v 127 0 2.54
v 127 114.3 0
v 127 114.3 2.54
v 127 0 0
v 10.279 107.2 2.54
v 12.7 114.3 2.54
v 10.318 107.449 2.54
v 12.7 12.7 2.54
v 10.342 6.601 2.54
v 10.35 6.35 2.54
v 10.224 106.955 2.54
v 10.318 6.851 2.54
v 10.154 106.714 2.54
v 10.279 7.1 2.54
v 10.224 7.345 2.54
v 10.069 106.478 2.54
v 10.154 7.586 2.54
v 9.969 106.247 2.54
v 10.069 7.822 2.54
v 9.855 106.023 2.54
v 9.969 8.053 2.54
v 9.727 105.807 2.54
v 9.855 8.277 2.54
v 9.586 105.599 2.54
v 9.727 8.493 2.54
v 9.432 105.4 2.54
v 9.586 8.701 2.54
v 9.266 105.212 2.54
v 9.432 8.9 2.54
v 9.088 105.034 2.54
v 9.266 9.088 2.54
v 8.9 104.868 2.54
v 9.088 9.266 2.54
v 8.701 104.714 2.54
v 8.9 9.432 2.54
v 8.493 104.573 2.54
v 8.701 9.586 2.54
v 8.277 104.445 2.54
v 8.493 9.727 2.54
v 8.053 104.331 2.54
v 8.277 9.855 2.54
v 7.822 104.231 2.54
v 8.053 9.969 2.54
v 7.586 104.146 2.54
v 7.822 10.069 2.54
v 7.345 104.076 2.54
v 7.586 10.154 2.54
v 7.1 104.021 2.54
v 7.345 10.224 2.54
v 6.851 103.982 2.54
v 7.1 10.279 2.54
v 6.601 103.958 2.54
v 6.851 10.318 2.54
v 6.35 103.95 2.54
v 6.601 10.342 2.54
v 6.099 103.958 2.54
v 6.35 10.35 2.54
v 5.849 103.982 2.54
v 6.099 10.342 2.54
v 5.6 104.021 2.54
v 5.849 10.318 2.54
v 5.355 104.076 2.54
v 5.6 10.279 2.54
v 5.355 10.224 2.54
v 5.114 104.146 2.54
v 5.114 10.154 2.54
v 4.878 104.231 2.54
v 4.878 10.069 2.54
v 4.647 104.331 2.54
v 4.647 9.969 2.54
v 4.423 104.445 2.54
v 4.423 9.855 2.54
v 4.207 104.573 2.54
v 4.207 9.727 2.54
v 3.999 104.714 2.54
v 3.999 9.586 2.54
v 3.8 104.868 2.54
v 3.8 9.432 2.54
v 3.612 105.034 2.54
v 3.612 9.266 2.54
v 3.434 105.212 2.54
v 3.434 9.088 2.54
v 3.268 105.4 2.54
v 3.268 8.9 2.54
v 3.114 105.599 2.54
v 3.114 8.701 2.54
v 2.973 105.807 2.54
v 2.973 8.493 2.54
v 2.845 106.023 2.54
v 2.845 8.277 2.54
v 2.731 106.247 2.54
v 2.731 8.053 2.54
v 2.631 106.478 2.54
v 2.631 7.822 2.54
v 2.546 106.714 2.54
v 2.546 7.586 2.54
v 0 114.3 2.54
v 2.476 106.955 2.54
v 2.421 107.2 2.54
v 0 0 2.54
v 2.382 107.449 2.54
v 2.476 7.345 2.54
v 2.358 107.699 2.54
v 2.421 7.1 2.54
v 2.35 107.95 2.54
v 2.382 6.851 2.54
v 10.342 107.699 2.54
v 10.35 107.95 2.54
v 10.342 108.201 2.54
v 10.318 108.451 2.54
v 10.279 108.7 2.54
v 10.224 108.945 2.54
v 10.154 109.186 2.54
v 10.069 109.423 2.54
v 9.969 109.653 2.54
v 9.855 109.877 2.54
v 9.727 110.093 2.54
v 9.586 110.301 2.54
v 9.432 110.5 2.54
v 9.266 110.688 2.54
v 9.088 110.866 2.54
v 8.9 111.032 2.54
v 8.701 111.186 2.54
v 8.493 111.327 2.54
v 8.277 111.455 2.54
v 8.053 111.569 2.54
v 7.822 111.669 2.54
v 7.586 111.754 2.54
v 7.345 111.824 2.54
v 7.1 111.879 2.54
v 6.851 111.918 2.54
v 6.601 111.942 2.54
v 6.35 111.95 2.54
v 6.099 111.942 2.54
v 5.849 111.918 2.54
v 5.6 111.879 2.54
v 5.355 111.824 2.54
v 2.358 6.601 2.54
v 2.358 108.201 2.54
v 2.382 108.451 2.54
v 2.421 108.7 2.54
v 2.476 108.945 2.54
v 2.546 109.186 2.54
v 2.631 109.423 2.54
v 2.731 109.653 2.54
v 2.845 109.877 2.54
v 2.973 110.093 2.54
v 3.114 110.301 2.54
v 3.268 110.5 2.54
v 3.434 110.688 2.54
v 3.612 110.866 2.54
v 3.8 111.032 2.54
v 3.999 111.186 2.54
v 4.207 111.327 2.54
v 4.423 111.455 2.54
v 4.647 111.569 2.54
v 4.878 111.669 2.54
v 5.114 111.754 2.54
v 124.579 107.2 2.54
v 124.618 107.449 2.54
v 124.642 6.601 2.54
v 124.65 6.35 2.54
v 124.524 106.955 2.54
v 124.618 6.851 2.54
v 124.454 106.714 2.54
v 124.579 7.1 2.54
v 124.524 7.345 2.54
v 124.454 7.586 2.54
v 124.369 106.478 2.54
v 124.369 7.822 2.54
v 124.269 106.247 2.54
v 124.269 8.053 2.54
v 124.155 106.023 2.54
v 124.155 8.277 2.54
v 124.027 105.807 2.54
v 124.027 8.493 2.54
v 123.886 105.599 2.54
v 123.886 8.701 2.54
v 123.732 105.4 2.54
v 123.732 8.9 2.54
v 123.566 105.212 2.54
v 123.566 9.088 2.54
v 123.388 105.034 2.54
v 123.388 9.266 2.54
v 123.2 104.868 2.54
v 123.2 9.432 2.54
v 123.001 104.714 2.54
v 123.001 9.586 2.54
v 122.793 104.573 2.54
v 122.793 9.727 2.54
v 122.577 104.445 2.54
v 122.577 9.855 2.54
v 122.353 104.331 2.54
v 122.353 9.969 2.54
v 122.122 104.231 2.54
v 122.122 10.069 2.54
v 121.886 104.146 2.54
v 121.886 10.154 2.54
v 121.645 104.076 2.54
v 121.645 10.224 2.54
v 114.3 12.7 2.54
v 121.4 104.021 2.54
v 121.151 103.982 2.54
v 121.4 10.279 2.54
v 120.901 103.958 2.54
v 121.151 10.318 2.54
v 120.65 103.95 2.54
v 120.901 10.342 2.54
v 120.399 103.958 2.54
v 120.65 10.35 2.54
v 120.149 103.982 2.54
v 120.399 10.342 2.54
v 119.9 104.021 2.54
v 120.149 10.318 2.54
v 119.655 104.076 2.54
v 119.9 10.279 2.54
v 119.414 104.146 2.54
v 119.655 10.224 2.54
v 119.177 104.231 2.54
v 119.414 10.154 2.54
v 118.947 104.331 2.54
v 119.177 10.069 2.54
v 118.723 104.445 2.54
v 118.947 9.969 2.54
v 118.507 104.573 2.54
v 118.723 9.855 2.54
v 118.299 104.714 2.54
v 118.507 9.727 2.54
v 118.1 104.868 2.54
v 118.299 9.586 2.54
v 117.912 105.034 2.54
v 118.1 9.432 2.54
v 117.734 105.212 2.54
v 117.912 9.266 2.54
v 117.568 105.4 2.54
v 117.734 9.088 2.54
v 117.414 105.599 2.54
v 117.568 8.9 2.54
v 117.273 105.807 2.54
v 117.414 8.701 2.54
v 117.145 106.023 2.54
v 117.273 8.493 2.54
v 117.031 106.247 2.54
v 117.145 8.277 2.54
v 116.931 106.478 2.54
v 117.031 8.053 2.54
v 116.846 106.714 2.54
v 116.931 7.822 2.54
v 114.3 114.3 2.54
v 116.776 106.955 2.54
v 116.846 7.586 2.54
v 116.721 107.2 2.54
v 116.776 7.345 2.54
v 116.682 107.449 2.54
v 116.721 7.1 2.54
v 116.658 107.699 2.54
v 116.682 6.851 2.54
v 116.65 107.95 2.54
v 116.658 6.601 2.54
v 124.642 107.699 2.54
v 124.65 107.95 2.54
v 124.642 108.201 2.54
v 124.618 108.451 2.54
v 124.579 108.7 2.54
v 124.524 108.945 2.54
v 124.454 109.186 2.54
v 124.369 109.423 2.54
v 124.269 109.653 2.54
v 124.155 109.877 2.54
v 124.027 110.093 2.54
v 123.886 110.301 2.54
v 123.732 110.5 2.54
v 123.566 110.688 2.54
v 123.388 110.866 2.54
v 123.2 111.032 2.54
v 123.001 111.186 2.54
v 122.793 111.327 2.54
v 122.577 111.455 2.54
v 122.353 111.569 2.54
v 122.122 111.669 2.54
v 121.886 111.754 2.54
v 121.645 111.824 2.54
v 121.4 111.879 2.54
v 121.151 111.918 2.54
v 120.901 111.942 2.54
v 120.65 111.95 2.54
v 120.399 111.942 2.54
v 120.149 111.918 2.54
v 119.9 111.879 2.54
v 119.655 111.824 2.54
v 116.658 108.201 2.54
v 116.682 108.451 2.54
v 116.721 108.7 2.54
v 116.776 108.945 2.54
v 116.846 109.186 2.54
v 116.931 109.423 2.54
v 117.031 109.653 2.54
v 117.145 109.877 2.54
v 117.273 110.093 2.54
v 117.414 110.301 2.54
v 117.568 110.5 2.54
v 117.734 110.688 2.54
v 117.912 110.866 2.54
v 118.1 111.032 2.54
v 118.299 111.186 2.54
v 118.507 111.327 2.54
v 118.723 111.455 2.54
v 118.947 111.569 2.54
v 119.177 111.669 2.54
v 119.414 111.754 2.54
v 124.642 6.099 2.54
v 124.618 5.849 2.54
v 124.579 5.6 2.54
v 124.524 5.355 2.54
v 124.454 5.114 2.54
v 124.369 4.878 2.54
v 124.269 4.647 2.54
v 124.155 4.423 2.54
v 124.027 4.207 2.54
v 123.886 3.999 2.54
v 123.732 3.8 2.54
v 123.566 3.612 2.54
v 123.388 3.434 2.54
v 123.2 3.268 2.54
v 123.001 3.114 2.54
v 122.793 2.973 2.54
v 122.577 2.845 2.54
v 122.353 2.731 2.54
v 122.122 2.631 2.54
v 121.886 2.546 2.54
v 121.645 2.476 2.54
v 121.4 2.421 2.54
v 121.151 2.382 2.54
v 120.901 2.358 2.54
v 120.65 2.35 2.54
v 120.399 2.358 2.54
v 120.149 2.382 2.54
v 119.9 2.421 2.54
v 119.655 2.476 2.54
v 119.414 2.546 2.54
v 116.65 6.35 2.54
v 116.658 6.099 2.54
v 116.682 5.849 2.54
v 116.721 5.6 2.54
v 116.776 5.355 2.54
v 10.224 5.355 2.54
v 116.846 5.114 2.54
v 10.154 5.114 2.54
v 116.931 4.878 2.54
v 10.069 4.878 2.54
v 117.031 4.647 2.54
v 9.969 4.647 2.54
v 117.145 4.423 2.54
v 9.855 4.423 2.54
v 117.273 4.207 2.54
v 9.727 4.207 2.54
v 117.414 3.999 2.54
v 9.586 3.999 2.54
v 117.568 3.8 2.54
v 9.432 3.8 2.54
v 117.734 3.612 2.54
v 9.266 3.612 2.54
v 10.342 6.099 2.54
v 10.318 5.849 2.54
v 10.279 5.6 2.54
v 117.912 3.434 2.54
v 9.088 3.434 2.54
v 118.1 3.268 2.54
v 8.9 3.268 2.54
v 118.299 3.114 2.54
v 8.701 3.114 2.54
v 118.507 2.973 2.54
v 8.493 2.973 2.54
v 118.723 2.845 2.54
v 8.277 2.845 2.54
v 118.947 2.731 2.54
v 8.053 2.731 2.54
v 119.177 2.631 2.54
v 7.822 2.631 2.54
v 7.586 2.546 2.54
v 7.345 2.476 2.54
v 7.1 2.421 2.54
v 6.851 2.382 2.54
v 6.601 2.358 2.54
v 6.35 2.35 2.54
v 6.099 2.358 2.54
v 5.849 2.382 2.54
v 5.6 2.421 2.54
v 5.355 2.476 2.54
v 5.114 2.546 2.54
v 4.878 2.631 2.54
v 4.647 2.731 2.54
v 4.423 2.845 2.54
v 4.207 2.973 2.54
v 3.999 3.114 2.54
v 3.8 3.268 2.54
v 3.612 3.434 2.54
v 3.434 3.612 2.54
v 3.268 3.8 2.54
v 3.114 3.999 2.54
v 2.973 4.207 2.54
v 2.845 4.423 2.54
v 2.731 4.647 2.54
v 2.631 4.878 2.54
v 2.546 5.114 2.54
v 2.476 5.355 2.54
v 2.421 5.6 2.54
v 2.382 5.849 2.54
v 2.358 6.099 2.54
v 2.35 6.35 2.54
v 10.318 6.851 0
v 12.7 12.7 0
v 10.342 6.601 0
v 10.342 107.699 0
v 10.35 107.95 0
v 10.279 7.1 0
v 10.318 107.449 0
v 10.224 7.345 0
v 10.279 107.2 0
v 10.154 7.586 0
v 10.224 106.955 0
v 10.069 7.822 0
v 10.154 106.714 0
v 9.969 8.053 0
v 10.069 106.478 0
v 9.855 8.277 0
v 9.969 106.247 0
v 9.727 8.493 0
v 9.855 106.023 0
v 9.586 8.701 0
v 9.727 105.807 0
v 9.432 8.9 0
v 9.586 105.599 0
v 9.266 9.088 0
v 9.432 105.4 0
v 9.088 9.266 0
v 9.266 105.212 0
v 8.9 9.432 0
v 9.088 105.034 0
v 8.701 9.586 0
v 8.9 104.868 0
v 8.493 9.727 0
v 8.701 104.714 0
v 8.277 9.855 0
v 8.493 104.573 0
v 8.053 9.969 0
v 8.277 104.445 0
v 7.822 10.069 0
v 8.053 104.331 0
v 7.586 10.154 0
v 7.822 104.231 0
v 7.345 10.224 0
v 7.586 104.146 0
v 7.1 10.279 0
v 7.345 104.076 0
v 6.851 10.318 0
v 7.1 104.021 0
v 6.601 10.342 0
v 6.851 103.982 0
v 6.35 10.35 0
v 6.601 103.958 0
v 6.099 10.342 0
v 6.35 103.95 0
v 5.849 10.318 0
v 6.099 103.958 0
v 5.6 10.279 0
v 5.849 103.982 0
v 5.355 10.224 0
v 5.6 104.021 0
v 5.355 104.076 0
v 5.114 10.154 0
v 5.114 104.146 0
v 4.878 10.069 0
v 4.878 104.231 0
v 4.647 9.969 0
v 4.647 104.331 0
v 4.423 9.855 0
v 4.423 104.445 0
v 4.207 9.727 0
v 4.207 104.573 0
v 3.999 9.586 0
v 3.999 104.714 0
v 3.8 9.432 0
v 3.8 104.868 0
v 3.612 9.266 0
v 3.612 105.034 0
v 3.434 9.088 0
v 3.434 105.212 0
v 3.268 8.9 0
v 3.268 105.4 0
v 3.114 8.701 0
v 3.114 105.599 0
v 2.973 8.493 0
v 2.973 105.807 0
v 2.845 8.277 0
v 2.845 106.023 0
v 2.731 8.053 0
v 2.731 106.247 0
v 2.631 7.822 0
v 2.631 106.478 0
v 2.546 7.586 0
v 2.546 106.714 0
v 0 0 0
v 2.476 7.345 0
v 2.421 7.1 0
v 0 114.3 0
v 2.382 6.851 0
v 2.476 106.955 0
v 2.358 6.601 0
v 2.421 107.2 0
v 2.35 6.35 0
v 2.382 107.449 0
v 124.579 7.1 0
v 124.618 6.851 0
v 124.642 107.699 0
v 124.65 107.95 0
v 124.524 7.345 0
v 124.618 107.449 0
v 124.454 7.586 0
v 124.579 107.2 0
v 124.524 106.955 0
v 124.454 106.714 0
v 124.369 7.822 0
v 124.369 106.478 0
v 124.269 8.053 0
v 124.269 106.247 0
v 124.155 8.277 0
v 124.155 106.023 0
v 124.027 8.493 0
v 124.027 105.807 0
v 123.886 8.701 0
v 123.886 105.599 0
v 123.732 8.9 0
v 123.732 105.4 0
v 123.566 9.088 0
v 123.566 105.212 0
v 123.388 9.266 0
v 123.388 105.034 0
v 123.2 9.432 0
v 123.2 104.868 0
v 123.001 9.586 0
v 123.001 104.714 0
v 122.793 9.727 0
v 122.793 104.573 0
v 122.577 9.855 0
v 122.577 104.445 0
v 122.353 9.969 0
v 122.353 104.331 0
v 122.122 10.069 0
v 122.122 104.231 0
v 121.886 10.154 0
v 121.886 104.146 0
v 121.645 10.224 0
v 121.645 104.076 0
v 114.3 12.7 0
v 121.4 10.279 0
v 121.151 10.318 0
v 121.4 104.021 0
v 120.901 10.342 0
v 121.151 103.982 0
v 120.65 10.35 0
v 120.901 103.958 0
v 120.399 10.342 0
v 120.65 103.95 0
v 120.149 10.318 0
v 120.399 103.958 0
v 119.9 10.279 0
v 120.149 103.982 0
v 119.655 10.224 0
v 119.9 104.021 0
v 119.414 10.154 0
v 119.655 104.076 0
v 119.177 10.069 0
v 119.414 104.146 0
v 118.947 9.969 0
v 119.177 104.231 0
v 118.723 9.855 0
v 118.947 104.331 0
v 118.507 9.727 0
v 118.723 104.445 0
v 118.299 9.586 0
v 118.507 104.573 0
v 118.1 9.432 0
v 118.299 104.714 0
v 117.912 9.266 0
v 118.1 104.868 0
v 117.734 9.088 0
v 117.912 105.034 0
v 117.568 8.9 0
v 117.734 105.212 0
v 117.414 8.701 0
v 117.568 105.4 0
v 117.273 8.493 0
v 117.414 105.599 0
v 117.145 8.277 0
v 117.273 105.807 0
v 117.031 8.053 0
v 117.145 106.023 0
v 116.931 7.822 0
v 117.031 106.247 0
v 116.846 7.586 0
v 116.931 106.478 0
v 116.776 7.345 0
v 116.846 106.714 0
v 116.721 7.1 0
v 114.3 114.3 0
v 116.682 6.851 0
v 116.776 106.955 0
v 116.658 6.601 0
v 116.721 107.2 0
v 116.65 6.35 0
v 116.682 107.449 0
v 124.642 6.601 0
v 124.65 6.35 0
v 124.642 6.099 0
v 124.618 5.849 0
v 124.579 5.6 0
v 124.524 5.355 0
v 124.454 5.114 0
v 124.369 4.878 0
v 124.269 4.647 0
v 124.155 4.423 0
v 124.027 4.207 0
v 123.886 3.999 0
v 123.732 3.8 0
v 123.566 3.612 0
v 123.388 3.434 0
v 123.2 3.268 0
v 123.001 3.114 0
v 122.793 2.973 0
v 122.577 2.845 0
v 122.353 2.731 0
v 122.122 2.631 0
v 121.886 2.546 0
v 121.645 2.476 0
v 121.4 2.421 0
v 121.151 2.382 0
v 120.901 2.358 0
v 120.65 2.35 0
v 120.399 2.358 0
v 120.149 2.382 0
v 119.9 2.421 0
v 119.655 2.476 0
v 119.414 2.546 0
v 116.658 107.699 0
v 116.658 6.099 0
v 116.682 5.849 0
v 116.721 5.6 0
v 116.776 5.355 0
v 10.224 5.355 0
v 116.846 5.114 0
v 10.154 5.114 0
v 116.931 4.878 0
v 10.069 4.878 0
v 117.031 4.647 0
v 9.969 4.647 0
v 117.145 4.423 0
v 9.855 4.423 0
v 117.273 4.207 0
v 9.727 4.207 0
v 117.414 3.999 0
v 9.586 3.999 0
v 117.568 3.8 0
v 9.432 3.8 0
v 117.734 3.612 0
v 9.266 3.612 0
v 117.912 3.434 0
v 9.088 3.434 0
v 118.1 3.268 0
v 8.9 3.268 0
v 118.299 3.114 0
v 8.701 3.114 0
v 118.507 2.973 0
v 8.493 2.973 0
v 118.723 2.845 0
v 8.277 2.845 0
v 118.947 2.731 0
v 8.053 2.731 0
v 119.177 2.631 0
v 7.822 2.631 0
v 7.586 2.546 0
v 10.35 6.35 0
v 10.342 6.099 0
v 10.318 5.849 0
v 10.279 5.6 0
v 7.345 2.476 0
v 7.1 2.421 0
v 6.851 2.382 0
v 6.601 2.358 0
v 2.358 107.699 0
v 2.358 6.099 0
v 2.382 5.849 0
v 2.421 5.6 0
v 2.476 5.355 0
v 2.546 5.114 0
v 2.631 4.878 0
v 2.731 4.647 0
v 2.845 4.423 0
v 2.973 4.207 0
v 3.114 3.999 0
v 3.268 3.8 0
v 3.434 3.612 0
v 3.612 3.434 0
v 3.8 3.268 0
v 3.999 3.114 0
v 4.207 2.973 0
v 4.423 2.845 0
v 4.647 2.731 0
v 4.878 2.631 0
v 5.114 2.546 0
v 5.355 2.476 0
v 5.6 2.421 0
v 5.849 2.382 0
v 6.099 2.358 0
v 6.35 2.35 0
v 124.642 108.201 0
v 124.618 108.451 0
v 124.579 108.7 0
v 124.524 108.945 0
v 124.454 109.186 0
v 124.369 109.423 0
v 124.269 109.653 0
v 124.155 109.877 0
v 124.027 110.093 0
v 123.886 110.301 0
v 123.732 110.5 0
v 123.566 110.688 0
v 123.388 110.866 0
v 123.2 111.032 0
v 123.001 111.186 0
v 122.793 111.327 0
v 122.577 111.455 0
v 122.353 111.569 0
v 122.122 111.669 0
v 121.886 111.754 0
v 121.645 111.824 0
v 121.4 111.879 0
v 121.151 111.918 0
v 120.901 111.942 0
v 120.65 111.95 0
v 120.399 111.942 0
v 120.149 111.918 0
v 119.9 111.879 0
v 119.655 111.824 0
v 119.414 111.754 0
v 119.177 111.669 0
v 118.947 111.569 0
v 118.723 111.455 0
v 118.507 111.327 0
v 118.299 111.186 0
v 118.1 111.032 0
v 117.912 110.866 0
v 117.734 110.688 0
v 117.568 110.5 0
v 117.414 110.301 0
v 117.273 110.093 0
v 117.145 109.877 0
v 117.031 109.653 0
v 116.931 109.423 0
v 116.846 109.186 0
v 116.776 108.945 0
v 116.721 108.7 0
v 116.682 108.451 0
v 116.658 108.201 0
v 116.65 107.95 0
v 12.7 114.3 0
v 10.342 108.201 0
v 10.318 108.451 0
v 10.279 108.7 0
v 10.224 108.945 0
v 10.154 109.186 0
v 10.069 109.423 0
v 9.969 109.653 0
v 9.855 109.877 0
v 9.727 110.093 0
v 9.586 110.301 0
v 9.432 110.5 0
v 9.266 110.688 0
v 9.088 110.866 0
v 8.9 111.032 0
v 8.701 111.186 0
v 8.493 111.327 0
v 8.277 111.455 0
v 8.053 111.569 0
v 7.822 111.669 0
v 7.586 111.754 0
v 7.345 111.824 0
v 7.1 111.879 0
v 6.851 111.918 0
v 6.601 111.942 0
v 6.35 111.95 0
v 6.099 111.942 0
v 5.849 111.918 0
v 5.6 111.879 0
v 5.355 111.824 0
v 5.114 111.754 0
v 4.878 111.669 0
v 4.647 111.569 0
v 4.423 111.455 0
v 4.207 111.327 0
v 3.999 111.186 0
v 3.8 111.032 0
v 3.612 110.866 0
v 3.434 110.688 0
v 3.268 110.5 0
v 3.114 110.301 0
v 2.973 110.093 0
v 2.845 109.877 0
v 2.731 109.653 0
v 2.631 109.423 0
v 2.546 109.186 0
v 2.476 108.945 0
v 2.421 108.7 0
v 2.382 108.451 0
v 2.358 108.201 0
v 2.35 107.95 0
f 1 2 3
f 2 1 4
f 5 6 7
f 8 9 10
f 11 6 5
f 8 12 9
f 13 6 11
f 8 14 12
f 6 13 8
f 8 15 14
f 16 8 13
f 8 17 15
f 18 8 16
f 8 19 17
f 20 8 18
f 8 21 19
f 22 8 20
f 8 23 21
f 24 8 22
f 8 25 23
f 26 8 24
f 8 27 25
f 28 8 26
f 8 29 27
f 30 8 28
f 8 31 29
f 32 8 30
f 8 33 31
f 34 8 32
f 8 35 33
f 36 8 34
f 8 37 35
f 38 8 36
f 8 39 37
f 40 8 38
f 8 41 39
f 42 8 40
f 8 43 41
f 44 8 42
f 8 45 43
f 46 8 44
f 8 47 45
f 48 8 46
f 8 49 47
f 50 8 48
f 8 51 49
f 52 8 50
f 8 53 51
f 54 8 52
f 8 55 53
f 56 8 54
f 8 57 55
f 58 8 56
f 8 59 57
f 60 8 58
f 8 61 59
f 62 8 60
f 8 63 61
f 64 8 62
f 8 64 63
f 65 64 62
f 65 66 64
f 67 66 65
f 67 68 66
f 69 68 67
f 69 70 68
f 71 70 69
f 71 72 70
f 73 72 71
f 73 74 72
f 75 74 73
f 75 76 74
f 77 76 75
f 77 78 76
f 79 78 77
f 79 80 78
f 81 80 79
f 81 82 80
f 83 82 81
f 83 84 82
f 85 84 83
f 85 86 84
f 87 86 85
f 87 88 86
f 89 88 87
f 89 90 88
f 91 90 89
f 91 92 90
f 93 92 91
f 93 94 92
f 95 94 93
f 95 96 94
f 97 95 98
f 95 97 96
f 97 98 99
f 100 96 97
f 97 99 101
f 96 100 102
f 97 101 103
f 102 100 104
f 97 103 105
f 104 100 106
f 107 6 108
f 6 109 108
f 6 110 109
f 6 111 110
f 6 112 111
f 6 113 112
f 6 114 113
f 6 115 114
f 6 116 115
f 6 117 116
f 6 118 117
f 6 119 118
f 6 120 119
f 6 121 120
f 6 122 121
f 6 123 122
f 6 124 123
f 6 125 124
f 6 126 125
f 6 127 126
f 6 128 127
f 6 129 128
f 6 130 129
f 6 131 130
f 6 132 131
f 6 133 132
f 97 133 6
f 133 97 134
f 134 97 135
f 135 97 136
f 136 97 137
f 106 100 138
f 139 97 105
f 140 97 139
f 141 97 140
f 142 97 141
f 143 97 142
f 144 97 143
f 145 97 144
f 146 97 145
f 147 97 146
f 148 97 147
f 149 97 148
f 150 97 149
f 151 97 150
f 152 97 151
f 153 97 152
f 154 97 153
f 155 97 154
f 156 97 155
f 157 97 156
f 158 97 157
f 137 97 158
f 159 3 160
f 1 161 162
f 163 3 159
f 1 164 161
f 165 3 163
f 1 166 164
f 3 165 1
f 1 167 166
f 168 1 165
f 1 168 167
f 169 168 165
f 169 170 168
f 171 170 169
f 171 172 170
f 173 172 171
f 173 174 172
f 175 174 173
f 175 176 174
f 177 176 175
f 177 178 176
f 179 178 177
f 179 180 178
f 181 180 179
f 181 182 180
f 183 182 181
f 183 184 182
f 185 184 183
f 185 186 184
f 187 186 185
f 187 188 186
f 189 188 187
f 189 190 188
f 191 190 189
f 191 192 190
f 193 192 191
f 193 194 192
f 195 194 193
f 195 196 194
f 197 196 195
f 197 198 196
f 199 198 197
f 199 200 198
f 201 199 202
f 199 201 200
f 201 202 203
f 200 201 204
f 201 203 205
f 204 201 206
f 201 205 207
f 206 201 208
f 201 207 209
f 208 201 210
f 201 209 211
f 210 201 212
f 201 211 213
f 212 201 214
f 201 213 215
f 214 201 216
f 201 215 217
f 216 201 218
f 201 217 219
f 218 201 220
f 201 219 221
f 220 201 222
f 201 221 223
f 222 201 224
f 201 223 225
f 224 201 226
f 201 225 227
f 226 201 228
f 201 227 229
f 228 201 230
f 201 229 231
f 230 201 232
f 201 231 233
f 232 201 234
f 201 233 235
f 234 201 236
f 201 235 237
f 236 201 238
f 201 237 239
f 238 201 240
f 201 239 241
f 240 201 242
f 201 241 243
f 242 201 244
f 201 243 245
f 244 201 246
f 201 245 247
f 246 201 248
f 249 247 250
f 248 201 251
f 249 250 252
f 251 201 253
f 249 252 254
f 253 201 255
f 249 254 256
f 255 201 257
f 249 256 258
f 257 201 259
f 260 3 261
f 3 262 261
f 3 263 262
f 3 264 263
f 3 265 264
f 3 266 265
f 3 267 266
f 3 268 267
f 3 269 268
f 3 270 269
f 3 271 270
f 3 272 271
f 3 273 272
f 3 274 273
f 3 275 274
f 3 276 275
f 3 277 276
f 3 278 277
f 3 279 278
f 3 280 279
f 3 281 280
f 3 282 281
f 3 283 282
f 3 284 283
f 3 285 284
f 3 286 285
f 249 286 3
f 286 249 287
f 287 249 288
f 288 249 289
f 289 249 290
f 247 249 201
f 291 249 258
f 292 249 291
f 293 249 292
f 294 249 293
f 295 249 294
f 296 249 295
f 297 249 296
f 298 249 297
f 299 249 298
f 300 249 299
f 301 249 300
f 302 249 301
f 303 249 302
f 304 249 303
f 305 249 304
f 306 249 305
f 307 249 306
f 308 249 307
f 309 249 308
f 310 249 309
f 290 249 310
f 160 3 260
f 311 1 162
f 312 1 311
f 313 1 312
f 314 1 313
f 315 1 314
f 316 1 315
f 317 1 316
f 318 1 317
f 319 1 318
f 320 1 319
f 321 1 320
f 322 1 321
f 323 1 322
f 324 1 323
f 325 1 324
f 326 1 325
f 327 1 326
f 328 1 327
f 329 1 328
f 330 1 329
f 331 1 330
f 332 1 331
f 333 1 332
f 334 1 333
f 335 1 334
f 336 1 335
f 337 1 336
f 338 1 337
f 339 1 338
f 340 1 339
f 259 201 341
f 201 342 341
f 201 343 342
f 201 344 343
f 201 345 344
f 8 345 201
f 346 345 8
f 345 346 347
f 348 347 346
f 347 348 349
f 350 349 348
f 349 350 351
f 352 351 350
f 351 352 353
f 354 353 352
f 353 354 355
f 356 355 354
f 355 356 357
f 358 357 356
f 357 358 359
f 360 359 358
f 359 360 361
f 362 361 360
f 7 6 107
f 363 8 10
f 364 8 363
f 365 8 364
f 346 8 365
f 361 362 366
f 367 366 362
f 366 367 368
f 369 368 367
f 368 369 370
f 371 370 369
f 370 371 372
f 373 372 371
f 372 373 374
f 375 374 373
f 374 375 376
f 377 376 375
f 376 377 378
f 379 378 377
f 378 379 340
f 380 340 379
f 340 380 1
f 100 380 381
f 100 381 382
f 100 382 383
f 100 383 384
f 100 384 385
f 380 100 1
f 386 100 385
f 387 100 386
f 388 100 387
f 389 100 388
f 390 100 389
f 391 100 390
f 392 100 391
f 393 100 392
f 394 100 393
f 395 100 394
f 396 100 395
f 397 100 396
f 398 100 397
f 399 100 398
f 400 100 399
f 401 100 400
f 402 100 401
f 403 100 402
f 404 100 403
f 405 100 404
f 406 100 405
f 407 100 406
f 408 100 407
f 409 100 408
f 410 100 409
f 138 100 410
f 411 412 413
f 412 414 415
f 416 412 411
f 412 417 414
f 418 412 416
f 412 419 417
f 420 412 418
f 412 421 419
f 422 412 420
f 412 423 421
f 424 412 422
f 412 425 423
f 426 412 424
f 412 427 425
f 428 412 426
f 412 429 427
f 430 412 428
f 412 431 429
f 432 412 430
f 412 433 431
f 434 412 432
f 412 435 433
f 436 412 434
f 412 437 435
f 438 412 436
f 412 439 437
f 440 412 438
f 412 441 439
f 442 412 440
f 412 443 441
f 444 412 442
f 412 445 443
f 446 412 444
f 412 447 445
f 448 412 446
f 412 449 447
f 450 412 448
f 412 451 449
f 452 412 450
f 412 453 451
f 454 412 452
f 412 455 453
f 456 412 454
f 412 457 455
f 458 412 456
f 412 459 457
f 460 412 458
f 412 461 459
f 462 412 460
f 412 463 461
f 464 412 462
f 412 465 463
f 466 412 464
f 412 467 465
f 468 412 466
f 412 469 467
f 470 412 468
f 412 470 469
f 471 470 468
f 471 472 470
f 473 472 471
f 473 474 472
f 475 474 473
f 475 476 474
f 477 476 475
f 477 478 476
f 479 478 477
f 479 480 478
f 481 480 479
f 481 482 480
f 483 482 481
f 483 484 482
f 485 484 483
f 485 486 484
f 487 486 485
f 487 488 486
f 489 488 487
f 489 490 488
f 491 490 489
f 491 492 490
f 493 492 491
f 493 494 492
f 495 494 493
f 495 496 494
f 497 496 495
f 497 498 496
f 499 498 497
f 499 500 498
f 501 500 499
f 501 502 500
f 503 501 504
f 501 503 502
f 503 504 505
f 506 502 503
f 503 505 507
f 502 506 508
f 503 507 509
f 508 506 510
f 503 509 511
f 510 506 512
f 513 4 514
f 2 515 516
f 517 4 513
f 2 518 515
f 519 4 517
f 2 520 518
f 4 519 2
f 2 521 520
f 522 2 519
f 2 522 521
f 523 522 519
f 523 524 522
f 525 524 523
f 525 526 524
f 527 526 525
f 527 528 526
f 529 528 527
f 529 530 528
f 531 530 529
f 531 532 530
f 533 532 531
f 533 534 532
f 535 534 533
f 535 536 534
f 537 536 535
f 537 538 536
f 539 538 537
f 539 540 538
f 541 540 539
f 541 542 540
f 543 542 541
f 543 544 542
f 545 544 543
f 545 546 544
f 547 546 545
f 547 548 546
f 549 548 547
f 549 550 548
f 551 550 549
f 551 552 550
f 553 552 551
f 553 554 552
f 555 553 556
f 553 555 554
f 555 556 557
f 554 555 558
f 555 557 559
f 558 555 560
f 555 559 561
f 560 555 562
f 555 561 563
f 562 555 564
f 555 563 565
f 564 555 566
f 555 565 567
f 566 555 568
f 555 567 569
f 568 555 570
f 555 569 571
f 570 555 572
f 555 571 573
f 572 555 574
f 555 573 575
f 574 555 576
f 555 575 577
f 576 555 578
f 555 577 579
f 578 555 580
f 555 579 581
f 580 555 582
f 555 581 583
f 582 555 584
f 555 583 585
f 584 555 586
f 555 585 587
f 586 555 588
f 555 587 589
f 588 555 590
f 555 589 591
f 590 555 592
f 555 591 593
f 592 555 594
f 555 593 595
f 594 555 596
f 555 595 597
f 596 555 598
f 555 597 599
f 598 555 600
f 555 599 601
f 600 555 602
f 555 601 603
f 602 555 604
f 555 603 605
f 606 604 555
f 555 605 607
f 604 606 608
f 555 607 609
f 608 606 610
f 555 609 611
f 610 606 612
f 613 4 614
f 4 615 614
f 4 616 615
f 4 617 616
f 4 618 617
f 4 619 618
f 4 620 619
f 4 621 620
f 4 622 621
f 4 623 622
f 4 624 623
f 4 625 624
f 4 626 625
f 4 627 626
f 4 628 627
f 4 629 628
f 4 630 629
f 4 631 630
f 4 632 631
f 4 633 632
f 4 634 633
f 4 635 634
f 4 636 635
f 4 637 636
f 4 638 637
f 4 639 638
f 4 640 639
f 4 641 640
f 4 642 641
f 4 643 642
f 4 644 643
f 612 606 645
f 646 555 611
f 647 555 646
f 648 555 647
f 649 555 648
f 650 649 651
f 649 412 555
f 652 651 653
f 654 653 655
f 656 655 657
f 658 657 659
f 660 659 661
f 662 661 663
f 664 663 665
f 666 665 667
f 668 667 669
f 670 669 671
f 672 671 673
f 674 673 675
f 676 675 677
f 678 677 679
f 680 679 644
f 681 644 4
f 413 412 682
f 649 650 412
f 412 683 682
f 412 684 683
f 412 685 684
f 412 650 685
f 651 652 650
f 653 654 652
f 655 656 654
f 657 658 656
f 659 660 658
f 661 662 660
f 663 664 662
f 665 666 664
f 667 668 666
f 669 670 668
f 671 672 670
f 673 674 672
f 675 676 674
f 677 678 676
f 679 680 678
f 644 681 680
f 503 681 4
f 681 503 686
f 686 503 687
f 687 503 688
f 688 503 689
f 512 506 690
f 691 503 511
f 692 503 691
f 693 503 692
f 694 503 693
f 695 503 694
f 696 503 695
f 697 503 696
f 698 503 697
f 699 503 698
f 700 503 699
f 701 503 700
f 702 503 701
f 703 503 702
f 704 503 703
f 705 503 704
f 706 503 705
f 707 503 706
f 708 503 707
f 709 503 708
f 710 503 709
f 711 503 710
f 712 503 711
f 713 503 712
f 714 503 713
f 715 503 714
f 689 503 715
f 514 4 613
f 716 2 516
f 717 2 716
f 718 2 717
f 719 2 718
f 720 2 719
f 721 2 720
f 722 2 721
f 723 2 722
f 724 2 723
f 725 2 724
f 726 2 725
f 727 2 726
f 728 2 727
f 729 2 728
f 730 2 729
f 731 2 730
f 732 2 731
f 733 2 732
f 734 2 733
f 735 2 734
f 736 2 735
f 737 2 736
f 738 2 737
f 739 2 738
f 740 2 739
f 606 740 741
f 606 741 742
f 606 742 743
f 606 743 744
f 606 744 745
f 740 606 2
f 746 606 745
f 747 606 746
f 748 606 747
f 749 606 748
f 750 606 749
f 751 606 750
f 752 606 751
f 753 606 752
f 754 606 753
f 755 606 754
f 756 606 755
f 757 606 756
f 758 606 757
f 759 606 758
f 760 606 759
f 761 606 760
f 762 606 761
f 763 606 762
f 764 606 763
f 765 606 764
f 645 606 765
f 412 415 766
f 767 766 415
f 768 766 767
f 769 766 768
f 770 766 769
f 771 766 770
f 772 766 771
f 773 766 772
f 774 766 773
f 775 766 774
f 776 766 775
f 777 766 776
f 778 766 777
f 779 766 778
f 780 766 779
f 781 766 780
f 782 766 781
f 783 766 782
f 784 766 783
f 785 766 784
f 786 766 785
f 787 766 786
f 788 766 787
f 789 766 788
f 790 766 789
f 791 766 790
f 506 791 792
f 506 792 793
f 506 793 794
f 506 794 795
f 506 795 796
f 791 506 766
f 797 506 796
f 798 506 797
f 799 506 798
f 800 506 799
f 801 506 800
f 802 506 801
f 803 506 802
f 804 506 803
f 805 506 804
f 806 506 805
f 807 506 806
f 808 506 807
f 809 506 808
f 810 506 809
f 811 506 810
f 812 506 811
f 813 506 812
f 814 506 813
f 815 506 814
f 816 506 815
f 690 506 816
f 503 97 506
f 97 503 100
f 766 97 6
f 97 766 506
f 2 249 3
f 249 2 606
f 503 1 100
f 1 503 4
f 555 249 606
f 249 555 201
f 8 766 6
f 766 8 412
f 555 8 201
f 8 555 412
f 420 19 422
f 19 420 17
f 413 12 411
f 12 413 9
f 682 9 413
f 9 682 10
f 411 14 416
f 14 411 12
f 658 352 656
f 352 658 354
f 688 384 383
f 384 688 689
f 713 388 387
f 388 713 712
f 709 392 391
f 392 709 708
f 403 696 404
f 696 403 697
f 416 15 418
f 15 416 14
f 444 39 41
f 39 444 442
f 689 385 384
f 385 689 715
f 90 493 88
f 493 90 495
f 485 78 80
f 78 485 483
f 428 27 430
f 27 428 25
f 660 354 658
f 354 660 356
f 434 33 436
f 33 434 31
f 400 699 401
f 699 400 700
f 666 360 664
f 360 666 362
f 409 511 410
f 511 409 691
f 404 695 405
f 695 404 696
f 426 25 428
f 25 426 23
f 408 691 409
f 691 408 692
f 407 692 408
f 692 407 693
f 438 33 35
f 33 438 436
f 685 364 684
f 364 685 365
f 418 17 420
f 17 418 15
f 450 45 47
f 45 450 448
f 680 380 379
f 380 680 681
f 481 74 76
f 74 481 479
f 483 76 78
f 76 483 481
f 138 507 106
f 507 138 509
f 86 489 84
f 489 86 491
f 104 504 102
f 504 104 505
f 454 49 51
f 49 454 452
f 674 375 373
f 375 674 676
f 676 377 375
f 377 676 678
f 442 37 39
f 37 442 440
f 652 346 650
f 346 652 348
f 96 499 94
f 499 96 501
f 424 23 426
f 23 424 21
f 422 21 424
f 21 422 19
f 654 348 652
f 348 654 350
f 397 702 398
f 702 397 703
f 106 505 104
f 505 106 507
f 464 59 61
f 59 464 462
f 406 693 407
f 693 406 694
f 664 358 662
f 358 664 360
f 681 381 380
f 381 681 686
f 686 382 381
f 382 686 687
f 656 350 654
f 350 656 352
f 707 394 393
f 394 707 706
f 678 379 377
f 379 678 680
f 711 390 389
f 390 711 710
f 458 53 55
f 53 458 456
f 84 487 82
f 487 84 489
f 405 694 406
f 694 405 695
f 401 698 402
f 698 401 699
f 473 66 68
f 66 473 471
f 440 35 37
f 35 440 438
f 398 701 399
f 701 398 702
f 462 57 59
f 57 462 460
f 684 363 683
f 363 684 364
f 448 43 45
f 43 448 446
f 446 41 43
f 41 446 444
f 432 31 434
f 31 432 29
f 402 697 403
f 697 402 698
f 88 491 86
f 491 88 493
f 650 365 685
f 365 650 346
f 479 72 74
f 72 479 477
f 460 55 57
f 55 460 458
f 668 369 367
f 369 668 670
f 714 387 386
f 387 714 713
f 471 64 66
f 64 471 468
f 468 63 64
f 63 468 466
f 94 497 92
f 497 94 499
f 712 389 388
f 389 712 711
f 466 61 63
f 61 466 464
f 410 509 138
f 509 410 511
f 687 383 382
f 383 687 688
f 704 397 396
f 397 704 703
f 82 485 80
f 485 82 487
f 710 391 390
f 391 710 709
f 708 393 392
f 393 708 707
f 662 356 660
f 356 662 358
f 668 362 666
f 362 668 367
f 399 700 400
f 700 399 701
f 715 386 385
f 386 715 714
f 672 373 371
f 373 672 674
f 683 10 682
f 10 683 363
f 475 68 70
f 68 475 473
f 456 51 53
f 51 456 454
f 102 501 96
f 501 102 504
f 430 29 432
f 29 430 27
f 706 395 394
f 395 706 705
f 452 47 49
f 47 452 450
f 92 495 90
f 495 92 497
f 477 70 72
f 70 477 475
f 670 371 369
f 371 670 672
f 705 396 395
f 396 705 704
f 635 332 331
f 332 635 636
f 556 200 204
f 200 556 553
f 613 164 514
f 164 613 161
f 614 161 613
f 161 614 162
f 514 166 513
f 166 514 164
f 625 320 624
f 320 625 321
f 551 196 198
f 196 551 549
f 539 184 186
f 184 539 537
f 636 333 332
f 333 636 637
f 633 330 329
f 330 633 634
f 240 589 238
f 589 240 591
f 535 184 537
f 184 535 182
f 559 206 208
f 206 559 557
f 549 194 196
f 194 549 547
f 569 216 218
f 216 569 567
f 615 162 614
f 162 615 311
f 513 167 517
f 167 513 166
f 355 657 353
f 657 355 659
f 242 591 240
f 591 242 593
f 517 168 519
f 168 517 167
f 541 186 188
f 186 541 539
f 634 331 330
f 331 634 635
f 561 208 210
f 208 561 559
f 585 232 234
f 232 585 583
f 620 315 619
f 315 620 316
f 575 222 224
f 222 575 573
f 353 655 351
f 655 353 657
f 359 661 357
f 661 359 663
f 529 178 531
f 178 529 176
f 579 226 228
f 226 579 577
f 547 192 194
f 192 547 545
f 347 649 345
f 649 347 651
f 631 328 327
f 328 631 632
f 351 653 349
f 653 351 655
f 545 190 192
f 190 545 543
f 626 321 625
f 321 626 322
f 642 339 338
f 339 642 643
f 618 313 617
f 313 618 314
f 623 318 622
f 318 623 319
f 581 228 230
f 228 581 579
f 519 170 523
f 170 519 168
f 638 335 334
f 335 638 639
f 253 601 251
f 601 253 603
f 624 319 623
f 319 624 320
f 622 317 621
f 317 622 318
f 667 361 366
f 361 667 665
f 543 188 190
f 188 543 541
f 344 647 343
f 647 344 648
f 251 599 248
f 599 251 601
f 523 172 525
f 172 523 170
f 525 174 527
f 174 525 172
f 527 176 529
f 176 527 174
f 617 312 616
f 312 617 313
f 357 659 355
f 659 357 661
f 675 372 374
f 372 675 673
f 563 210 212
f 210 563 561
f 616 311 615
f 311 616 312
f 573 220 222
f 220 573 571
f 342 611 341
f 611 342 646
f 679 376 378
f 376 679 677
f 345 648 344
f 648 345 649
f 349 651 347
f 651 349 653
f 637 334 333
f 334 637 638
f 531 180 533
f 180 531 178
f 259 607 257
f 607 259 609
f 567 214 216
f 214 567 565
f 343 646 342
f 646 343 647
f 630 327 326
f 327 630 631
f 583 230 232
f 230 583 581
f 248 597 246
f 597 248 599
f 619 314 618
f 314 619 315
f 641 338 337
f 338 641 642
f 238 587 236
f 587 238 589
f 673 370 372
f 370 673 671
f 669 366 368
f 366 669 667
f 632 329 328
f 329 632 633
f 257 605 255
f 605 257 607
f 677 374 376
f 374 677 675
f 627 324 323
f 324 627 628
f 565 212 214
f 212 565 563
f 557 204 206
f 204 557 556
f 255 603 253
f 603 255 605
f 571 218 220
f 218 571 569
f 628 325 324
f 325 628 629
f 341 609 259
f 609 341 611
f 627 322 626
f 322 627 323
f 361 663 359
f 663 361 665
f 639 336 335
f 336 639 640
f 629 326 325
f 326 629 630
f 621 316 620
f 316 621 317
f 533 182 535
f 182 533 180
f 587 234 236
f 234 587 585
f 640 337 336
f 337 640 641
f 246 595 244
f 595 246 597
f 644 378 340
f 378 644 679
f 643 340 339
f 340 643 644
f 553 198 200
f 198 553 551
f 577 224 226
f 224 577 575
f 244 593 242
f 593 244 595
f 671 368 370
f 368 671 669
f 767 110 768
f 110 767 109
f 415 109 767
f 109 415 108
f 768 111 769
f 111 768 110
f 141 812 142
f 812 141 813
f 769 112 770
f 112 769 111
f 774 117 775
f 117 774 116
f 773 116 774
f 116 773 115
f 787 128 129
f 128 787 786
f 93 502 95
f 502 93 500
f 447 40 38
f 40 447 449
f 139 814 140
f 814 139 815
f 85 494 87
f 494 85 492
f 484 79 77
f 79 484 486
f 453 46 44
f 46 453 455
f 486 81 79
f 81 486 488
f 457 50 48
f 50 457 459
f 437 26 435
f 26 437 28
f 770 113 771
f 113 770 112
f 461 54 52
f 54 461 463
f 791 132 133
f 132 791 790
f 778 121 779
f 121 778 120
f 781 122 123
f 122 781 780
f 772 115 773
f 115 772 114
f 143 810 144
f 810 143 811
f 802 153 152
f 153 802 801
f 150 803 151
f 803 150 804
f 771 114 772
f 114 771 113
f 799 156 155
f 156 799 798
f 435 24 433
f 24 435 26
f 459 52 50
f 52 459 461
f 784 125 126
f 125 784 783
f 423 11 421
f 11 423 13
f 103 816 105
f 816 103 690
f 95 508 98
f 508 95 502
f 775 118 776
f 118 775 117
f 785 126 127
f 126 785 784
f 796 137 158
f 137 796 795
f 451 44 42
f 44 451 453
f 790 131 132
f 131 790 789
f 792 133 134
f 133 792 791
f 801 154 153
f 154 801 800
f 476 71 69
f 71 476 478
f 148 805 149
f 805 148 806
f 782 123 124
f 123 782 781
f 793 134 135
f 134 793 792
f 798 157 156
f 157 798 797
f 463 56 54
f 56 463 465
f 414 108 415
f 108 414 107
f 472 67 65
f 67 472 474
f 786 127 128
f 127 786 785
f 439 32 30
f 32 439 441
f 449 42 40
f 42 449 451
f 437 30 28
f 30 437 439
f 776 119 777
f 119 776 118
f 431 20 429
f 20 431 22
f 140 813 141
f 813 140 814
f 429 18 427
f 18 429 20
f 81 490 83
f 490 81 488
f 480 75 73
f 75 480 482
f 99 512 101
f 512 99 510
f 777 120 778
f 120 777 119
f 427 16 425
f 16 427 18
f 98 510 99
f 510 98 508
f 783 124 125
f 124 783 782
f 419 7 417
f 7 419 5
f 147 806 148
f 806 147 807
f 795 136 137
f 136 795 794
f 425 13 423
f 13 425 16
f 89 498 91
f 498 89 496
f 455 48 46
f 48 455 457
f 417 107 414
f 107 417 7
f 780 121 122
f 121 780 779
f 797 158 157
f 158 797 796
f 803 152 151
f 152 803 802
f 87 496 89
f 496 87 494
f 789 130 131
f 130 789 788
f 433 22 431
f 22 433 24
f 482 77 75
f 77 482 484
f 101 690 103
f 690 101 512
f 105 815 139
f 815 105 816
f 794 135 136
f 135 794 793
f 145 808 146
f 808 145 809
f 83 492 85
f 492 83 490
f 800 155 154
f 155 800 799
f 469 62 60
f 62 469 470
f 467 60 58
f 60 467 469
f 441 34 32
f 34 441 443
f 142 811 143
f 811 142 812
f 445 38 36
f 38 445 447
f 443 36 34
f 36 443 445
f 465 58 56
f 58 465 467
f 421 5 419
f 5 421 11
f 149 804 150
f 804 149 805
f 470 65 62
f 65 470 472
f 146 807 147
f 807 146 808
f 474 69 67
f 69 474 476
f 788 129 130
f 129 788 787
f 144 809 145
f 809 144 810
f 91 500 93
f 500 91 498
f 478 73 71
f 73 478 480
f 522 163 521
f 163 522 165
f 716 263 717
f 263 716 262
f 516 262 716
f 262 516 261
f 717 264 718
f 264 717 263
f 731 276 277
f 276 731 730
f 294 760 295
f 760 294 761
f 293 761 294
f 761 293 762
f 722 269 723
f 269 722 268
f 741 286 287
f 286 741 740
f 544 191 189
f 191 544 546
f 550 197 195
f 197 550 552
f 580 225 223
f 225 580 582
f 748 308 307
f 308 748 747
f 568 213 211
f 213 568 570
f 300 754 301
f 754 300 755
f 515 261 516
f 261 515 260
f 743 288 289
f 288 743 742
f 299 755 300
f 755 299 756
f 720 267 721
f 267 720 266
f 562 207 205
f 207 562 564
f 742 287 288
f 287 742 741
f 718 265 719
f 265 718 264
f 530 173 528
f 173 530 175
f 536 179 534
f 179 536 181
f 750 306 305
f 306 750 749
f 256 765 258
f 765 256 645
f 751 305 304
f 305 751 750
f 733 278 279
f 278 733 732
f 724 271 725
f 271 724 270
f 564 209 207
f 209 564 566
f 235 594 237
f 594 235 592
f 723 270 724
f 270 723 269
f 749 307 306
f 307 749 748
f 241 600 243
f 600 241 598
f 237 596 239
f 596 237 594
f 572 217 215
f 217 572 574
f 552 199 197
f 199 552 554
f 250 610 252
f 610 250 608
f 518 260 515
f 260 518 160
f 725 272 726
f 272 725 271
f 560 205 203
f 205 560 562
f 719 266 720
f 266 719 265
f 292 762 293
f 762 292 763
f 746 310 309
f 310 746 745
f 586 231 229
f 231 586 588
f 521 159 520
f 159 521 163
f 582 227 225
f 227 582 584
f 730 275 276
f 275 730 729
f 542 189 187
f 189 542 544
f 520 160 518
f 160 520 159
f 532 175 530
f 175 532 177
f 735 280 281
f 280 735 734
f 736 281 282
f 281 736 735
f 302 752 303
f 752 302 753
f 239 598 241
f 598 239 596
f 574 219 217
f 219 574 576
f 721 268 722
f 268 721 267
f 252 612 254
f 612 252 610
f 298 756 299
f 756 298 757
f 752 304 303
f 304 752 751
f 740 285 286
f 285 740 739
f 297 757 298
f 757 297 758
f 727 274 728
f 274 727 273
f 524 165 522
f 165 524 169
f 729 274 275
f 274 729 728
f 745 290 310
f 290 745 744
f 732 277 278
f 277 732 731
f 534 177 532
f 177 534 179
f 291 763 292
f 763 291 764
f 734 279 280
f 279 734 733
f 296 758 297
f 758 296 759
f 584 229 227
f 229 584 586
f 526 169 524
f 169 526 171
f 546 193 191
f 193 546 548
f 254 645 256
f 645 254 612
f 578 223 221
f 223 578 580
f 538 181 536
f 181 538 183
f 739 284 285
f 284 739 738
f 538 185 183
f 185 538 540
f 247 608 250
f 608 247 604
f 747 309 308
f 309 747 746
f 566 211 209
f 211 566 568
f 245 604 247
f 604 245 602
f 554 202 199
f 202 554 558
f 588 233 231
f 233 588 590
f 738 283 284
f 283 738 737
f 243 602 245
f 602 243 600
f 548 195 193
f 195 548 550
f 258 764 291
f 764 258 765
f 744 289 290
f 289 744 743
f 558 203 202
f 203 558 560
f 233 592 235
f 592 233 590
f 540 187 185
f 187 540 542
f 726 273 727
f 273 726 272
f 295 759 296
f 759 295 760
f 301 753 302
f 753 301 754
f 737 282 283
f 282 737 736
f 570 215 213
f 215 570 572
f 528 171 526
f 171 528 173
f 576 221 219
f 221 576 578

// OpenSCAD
// file: constants.scad
/* GENERAL */

UNIT = 25.4; // 25.4 for in - 1 for mm
$FN = 100;

/* COVER */

COVER_BASE_WIDTH = 4 * UNIT;
COVER_BASE_LENGTH = 4 * UNIT;
COVER_BASE_THICKNESS = 0.1 * UNIT;

COVER_HEIGHT = 1.25 * UNIT;
COVER_TOP_SCALE = 0.8;

COVER_HORIZONTAL_PADDING = 0.5 * UNIT;
COVER_VERTICAL_PADDING = 0.5 * UNIT;

/* LEVEL */

LEVEL_HORIZONTAL_PADDING = 0.5 * UNIT;
LEVEl_VERTICAL_PADDING = 0.5 * UNIT;

/* RISERS */

RISER_LENGTH = LEVEl_VERTICAL_PADDING;
// main file
include <constants.scad>;

/*
Generates the U-shaped base of the `level` part

@param    decimal   w   width of the inner cover
@param    decimal   l   length of the inner cover
@param    decimal   t   thickness of the plate
@param    decimal   wp  width-wise padding on each side
@param    decimal   lp  length-wise padding at bottom-most side  
*/
module level_base(w, l, t, hp, vp) {
  difference() {
    cube([w + 2*hp, l + vp, t], $fn=$FN);
    translate([hp, vp, 0]) cube([w, l+vp, t], $fn=$FN);
  }
};

module level_mount(t) {
  cylinder(h=t, d=8, $fn=$FN);
};

/*
Generates the `level` part of the ESC enclosure assembly

@param    decimal   w   width of the inner cover
@param    decimal   l   length of the inner cover
@param    decimal   t   thickness of the plate
@param    decimal   wp  width-wise padding on each side
@param    decimal   lp  length-wise padding at bottom-most side
*/
module level(w, l, t, hp, vp) {
  mid_wp = hp / 2;
  mid_vp = vp / 2;
  
  difference() {
    // base
    level_base(w, l, t, hp, vp);
    
    // 4 mount points
    translate([mid_wp, mid_vp, 0]) {
      translate([0, 0, 0])  level_mount(t);
      translate([w+hp, 0, 0])  level_mount(t);
      translate([0, l, 0])  level_mount(t);
      translate([w+hp, l, 0])  level_mount(t);  
    }
    
  }
}

level(
  w=COVER_BASE_WIDTH,
  l=COVER_BASE_LENGTH,
  t=COVER_BASE_THICKNESS,
  hp=LEVEL_HORIZONTAL_PADDING,
  vp=LEVEl_VERTICAL_PADDING
);
